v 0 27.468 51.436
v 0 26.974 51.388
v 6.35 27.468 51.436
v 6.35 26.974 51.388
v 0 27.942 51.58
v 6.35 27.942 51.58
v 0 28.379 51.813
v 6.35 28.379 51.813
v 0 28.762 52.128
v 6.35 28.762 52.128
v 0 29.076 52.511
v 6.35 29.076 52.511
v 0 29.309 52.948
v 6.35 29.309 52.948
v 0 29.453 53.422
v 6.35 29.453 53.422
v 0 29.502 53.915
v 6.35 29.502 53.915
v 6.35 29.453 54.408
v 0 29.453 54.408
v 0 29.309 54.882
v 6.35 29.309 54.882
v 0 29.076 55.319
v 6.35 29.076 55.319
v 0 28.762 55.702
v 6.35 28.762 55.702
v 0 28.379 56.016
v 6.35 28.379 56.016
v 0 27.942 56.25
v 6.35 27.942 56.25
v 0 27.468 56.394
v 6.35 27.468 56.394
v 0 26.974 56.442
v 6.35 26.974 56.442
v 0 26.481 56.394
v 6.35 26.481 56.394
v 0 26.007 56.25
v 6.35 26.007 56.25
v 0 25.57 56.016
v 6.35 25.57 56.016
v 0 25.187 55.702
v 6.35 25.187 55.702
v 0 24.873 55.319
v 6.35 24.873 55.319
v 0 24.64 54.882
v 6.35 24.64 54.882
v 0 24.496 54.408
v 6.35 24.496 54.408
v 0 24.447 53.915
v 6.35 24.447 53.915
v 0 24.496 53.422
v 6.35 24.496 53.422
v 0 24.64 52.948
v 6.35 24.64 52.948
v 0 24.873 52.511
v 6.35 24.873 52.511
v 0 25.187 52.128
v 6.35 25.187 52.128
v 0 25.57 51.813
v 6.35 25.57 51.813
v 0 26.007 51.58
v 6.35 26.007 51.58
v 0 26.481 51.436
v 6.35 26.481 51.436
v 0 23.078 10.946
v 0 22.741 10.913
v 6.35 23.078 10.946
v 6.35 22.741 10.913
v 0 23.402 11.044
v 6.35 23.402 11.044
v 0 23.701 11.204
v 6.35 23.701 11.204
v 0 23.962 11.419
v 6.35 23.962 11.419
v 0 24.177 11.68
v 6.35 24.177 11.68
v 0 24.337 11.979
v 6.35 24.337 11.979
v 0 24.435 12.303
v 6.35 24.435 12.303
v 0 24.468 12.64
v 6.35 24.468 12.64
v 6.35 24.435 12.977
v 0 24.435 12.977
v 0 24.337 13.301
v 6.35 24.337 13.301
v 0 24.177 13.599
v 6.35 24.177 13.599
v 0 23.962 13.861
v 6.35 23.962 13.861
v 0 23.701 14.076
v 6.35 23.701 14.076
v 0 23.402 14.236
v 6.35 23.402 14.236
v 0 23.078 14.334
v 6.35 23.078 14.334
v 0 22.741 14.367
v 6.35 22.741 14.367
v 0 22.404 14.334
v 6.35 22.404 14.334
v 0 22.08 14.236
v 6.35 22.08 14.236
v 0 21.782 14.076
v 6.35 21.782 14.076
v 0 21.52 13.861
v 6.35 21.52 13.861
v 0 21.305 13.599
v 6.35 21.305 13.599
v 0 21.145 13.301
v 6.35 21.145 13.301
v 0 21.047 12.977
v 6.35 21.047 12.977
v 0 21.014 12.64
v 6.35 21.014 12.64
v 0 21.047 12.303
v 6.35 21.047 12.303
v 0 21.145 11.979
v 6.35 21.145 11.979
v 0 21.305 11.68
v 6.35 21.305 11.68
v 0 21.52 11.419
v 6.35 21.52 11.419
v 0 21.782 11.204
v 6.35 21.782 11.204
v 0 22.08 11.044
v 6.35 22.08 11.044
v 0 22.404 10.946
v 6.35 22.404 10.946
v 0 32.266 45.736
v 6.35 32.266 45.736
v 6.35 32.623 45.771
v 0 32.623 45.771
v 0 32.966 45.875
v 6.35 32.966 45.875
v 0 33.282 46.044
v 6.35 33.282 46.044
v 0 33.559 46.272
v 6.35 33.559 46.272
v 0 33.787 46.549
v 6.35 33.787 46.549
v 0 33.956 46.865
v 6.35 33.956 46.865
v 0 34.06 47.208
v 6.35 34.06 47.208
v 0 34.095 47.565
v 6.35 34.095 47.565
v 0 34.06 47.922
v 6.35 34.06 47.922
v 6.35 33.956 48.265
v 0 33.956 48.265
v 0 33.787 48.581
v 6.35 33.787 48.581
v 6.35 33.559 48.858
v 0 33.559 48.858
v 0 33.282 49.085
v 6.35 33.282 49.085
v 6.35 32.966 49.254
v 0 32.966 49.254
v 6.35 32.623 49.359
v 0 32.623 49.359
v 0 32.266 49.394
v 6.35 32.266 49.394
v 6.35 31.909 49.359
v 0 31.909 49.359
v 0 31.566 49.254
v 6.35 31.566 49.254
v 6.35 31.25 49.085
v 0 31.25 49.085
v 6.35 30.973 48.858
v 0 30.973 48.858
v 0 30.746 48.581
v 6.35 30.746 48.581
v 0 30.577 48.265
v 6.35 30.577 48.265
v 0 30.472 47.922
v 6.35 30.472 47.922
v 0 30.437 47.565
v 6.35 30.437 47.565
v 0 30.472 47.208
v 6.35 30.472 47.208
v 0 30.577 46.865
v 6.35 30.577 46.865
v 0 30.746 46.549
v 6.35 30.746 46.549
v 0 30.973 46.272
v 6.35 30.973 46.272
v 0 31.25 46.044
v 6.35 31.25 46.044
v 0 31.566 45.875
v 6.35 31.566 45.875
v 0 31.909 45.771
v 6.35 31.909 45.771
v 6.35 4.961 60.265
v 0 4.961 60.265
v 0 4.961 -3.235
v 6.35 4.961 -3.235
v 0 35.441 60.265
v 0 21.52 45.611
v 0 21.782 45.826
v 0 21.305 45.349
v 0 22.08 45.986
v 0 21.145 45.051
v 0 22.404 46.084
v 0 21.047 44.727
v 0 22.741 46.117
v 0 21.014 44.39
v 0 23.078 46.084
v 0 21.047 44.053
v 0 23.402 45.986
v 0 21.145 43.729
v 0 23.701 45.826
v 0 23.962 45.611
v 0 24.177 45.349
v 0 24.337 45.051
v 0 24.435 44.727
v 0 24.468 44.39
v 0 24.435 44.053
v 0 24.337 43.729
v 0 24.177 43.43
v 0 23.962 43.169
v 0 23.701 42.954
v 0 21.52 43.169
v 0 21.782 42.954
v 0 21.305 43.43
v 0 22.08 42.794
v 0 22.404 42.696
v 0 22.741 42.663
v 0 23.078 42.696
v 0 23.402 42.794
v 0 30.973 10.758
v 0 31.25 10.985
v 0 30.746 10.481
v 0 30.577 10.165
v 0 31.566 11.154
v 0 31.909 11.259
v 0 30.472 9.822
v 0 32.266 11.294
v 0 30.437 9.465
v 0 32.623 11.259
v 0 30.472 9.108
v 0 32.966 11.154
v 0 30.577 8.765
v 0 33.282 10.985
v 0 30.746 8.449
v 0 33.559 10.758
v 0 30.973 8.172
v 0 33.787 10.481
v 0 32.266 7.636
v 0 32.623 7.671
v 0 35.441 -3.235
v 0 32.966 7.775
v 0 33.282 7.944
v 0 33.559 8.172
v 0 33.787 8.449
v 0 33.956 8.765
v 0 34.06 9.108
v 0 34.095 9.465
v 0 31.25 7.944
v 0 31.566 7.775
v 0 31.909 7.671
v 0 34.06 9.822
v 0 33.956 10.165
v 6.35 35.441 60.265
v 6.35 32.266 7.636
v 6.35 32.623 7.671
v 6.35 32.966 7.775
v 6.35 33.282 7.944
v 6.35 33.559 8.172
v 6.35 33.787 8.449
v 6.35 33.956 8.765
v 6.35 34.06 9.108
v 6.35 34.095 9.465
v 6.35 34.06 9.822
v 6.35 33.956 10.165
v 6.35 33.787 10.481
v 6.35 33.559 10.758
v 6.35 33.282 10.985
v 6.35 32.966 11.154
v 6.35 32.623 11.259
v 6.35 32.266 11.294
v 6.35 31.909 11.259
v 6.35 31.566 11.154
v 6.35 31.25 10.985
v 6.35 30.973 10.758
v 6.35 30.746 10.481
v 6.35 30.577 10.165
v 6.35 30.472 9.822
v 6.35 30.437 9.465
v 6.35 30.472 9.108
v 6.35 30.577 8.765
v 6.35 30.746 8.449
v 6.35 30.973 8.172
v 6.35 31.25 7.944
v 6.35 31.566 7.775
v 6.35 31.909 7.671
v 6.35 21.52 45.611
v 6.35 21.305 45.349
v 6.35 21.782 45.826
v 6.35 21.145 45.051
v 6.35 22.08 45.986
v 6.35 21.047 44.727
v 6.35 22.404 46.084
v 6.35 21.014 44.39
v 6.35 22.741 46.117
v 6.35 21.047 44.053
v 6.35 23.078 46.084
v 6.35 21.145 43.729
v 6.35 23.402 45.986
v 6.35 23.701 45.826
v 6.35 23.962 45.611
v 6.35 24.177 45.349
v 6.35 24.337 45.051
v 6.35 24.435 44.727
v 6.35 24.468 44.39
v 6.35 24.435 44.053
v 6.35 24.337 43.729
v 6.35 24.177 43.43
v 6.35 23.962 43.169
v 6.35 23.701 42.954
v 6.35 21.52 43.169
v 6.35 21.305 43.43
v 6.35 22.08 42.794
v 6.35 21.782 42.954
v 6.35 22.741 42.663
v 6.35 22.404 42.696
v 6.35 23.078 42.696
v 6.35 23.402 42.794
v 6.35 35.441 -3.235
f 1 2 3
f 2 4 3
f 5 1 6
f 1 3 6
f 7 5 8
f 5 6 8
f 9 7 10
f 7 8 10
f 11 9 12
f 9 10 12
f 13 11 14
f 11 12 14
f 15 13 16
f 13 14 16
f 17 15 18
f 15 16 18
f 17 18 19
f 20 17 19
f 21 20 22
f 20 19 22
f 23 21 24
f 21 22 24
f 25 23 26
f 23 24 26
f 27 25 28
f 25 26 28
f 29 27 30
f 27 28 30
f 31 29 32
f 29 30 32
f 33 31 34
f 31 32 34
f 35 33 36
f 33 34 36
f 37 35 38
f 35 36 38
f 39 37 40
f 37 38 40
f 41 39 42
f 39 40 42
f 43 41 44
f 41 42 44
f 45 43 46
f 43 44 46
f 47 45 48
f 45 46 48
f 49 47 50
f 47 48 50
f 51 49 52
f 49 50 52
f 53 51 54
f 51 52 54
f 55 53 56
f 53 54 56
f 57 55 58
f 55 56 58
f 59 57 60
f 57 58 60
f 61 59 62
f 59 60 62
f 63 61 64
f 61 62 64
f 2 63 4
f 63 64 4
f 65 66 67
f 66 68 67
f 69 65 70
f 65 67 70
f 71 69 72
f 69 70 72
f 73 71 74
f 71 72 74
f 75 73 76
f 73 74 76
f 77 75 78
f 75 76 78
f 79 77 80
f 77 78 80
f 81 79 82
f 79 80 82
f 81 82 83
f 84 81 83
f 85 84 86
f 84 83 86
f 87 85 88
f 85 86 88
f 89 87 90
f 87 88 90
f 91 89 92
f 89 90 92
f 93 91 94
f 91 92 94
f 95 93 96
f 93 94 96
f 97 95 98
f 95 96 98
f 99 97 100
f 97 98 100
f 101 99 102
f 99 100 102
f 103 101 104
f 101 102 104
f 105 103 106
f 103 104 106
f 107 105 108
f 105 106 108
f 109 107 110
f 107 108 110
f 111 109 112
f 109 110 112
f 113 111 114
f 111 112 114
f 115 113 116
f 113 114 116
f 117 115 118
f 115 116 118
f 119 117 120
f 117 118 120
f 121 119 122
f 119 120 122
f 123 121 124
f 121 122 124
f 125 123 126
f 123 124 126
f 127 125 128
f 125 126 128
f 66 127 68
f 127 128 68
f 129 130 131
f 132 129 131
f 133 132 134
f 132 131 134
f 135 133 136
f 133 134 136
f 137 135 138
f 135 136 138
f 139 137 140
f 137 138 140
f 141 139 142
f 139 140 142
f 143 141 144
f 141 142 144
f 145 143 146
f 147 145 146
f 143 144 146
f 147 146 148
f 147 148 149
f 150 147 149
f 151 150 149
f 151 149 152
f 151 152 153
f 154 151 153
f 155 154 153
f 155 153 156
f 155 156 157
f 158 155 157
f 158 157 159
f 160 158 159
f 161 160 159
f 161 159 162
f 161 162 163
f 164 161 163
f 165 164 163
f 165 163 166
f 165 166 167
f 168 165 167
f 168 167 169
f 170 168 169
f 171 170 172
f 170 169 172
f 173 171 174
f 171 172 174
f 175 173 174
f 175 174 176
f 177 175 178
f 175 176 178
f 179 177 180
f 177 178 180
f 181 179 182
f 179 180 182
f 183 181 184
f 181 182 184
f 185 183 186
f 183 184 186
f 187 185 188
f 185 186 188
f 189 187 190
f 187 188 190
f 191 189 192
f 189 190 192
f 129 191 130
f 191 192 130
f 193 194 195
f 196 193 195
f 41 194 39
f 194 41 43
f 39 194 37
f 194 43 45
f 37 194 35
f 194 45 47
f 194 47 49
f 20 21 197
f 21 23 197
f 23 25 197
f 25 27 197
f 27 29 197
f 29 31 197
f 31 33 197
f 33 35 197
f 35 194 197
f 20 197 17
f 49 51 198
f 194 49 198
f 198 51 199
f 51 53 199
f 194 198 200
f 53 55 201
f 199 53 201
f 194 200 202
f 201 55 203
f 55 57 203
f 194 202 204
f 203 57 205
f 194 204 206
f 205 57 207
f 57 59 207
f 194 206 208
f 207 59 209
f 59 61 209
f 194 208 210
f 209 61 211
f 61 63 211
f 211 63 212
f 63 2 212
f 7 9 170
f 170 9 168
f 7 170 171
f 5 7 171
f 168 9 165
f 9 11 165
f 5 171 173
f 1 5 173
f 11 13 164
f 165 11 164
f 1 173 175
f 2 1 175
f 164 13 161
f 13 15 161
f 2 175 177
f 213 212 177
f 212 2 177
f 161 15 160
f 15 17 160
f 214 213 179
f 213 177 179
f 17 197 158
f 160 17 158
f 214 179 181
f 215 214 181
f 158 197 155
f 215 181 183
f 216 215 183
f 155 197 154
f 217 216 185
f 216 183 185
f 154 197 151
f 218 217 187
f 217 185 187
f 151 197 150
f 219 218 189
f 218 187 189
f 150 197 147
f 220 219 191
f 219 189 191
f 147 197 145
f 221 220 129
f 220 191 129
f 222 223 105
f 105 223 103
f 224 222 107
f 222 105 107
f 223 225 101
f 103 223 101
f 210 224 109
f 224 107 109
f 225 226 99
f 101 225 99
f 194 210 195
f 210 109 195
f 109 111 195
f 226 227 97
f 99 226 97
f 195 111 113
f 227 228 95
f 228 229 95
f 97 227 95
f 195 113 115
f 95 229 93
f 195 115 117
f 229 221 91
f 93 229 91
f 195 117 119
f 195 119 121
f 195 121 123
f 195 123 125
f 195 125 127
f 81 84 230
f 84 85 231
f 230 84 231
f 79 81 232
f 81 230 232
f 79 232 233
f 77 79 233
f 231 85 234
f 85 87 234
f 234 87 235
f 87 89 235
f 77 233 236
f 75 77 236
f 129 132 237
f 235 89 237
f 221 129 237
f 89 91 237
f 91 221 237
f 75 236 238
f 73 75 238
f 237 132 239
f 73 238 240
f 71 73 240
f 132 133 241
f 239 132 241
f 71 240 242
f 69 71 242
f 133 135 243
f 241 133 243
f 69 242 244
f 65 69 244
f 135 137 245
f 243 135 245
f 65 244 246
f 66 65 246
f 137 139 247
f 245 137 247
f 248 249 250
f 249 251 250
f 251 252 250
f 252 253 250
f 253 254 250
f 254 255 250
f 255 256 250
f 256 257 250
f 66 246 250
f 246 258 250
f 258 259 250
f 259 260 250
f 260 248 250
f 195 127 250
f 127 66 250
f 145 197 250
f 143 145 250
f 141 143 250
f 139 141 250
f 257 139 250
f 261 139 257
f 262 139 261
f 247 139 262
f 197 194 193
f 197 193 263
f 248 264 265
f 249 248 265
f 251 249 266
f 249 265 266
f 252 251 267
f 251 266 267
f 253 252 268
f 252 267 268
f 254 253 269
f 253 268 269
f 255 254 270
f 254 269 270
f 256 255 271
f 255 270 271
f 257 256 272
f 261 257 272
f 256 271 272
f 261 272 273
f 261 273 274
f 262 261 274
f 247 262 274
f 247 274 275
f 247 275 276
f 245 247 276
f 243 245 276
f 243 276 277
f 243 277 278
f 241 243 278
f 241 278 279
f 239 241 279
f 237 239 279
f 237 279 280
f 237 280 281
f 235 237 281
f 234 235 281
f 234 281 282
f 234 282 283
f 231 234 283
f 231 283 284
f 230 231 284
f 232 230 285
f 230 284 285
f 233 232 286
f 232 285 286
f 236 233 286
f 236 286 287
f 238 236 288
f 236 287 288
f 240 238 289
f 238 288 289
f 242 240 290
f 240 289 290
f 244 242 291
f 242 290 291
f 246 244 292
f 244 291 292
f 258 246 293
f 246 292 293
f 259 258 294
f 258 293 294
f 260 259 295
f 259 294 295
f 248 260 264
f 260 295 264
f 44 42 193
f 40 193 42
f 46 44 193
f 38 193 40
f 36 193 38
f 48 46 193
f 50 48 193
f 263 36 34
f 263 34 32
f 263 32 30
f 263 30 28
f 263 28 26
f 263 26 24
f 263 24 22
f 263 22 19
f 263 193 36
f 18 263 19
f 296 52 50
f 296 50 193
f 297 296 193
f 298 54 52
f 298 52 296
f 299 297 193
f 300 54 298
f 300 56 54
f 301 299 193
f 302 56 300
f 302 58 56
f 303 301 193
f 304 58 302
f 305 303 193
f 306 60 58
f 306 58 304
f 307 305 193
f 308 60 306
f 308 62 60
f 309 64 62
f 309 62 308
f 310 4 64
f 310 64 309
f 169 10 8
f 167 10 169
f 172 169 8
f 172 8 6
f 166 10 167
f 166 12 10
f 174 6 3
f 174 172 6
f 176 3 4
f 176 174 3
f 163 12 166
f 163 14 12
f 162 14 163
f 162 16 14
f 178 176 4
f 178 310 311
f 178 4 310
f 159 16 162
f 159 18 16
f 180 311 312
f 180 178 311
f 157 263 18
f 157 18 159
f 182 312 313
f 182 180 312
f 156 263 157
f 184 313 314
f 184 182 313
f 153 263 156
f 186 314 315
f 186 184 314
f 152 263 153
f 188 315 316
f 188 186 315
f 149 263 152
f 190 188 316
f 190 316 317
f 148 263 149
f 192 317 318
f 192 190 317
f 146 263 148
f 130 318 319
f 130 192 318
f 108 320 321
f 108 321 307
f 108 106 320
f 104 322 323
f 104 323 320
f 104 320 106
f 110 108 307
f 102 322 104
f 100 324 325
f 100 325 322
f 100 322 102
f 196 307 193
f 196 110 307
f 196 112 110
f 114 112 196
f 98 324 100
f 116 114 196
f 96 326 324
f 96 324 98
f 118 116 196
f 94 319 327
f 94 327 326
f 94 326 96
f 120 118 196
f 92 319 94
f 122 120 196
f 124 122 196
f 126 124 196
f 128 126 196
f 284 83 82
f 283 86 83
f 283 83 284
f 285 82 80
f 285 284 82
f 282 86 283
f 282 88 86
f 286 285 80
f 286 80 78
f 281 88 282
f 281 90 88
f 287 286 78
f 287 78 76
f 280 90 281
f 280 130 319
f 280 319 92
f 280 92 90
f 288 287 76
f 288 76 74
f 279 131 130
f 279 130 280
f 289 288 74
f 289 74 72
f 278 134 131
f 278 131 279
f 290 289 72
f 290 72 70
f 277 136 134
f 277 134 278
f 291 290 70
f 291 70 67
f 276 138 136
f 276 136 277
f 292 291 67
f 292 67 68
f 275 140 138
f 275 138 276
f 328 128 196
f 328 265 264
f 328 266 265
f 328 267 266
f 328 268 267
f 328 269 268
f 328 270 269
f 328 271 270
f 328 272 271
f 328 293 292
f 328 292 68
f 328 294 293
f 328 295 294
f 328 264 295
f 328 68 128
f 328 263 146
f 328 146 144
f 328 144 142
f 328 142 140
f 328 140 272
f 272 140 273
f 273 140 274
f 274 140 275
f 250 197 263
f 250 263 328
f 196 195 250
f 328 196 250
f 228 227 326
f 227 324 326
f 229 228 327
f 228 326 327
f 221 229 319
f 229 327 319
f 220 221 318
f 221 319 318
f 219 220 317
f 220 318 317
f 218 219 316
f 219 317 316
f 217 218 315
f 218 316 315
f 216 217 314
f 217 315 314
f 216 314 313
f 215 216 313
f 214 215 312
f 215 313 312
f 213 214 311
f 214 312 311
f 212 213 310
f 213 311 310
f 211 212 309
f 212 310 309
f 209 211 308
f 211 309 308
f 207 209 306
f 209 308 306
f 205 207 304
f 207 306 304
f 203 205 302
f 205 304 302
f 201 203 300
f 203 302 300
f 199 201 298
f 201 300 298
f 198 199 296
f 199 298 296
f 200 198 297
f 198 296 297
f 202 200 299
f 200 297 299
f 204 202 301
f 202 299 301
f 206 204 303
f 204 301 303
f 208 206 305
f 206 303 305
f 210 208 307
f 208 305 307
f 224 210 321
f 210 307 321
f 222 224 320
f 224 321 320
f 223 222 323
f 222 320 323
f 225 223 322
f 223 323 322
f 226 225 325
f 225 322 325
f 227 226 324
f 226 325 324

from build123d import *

# Parameters (mm, degrees)
SKETCH1_W                                  = 63.5
SKETCH1_H                                  = 30.48
BOSS_EXTRUDE1_DEPTH                        = 6.35
TAP_DRILL_FOR_8_32_TAP1_D                  = 3.4544
TAP_DRILL_FOR_8_32_TAP1_DEPTH              = 6.35
TAP_DRILL_FOR_8_32_TAP1_TIP                = 1.037806461
F_6_CLOSE_CLEARANCE_HOLE_COUNTERSINK_D     = 3.6576
F_6_CLOSE_CLEARANCE_HOLE_COUNTERSINK_DEPTH = 6.35
F_8_THROUGH_HOLE_D                         = 5.0546
F_8_THROUGH_HOLE_DEPTH                     = 6.35
F_8_THROUGH_HOLE_TIP                       = 1.518555042


with BuildPart() as part:
    # Sketch1 → Boss-Extrude1 (new body)
    with BuildSketch(Plane(origin=(0, 0, 0), x_dir=(0, 0, -1), z_dir=(1, 0, 0))):
        with Locations((-28.514872299, 20.201128374)):
            Rectangle(SKETCH1_W, SKETCH1_H)
    extrude(amount=BOSS_EXTRUDE1_DEPTH)

    # Tap Drill for #8-32 Tap1
    with Locations(Plane.ZY):
        with Locations((12.639872299, 22.741128374), (44.389872299, 22.741128374)):
            Hole(TAP_DRILL_FOR_8_32_TAP1_D / 2, depth=TAP_DRILL_FOR_8_32_TAP1_DEPTH)
            with Locations((0, 0, -(TAP_DRILL_FOR_8_32_TAP1_DEPTH + TAP_DRILL_FOR_8_32_TAP1_TIP / 2))):  # 118° drill point
                Cone(0, TAP_DRILL_FOR_8_32_TAP1_D / 2, TAP_DRILL_FOR_8_32_TAP1_TIP, mode=Mode.SUBTRACT)

    # #6 Close clearance hole, countersink
    with Locations(Plane.ZY):
        with Locations((9.464872299, 32.266128374), (47.564872299, 32.266128374)):
            Hole(F_6_CLOSE_CLEARANCE_HOLE_COUNTERSINK_D / 2, depth=F_6_CLOSE_CLEARANCE_HOLE_COUNTERSINK_DEPTH)

    # #8 Through hole
    with Locations(Plane.ZY):
        with Locations((53.914872299, 26.974461707)):
            Hole(F_8_THROUGH_HOLE_D / 2, depth=F_8_THROUGH_HOLE_DEPTH)
            with Locations((0, 0, -(F_8_THROUGH_HOLE_DEPTH + F_8_THROUGH_HOLE_TIP / 2))):  # 118° drill point
                Cone(0, F_8_THROUGH_HOLE_D / 2, F_8_THROUGH_HOLE_TIP, mode=Mode.SUBTRACT)


solid = part.part
